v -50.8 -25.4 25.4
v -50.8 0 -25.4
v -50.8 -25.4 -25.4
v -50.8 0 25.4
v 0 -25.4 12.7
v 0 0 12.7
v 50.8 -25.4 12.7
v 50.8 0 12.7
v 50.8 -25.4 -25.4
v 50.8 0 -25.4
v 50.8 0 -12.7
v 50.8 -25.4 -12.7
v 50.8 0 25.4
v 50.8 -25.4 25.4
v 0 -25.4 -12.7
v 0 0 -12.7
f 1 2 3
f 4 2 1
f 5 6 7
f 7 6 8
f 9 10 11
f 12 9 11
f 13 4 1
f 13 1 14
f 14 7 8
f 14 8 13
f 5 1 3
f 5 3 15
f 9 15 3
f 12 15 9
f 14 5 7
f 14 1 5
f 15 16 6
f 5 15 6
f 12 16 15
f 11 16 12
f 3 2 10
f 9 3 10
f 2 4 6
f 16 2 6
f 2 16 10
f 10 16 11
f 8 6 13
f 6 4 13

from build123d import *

# Parameters (mm, degrees)
F0_W     = 101.6
F0_H     = 50.8
F1_DEPTH = 25.4
F2_W     = 50.8
F2_H     = 25.4
F3_DEPTH = 25.401


with BuildPart() as f1:
    # F0 (on Front) → F1 (new body)
    with BuildSketch(Plane.XZ):
        Rectangle(F0_W, F0_H)
    extrude(amount=F1_DEPTH)

    # F2 (on Front) → F3 (cut, through all)
    with BuildSketch(Plane.XZ):
        with Locations((25.4, 0)):
            Rectangle(F2_W, F2_H)
    extrude(amount=F3_DEPTH, mode=Mode.SUBTRACT)


solid = f1.part
